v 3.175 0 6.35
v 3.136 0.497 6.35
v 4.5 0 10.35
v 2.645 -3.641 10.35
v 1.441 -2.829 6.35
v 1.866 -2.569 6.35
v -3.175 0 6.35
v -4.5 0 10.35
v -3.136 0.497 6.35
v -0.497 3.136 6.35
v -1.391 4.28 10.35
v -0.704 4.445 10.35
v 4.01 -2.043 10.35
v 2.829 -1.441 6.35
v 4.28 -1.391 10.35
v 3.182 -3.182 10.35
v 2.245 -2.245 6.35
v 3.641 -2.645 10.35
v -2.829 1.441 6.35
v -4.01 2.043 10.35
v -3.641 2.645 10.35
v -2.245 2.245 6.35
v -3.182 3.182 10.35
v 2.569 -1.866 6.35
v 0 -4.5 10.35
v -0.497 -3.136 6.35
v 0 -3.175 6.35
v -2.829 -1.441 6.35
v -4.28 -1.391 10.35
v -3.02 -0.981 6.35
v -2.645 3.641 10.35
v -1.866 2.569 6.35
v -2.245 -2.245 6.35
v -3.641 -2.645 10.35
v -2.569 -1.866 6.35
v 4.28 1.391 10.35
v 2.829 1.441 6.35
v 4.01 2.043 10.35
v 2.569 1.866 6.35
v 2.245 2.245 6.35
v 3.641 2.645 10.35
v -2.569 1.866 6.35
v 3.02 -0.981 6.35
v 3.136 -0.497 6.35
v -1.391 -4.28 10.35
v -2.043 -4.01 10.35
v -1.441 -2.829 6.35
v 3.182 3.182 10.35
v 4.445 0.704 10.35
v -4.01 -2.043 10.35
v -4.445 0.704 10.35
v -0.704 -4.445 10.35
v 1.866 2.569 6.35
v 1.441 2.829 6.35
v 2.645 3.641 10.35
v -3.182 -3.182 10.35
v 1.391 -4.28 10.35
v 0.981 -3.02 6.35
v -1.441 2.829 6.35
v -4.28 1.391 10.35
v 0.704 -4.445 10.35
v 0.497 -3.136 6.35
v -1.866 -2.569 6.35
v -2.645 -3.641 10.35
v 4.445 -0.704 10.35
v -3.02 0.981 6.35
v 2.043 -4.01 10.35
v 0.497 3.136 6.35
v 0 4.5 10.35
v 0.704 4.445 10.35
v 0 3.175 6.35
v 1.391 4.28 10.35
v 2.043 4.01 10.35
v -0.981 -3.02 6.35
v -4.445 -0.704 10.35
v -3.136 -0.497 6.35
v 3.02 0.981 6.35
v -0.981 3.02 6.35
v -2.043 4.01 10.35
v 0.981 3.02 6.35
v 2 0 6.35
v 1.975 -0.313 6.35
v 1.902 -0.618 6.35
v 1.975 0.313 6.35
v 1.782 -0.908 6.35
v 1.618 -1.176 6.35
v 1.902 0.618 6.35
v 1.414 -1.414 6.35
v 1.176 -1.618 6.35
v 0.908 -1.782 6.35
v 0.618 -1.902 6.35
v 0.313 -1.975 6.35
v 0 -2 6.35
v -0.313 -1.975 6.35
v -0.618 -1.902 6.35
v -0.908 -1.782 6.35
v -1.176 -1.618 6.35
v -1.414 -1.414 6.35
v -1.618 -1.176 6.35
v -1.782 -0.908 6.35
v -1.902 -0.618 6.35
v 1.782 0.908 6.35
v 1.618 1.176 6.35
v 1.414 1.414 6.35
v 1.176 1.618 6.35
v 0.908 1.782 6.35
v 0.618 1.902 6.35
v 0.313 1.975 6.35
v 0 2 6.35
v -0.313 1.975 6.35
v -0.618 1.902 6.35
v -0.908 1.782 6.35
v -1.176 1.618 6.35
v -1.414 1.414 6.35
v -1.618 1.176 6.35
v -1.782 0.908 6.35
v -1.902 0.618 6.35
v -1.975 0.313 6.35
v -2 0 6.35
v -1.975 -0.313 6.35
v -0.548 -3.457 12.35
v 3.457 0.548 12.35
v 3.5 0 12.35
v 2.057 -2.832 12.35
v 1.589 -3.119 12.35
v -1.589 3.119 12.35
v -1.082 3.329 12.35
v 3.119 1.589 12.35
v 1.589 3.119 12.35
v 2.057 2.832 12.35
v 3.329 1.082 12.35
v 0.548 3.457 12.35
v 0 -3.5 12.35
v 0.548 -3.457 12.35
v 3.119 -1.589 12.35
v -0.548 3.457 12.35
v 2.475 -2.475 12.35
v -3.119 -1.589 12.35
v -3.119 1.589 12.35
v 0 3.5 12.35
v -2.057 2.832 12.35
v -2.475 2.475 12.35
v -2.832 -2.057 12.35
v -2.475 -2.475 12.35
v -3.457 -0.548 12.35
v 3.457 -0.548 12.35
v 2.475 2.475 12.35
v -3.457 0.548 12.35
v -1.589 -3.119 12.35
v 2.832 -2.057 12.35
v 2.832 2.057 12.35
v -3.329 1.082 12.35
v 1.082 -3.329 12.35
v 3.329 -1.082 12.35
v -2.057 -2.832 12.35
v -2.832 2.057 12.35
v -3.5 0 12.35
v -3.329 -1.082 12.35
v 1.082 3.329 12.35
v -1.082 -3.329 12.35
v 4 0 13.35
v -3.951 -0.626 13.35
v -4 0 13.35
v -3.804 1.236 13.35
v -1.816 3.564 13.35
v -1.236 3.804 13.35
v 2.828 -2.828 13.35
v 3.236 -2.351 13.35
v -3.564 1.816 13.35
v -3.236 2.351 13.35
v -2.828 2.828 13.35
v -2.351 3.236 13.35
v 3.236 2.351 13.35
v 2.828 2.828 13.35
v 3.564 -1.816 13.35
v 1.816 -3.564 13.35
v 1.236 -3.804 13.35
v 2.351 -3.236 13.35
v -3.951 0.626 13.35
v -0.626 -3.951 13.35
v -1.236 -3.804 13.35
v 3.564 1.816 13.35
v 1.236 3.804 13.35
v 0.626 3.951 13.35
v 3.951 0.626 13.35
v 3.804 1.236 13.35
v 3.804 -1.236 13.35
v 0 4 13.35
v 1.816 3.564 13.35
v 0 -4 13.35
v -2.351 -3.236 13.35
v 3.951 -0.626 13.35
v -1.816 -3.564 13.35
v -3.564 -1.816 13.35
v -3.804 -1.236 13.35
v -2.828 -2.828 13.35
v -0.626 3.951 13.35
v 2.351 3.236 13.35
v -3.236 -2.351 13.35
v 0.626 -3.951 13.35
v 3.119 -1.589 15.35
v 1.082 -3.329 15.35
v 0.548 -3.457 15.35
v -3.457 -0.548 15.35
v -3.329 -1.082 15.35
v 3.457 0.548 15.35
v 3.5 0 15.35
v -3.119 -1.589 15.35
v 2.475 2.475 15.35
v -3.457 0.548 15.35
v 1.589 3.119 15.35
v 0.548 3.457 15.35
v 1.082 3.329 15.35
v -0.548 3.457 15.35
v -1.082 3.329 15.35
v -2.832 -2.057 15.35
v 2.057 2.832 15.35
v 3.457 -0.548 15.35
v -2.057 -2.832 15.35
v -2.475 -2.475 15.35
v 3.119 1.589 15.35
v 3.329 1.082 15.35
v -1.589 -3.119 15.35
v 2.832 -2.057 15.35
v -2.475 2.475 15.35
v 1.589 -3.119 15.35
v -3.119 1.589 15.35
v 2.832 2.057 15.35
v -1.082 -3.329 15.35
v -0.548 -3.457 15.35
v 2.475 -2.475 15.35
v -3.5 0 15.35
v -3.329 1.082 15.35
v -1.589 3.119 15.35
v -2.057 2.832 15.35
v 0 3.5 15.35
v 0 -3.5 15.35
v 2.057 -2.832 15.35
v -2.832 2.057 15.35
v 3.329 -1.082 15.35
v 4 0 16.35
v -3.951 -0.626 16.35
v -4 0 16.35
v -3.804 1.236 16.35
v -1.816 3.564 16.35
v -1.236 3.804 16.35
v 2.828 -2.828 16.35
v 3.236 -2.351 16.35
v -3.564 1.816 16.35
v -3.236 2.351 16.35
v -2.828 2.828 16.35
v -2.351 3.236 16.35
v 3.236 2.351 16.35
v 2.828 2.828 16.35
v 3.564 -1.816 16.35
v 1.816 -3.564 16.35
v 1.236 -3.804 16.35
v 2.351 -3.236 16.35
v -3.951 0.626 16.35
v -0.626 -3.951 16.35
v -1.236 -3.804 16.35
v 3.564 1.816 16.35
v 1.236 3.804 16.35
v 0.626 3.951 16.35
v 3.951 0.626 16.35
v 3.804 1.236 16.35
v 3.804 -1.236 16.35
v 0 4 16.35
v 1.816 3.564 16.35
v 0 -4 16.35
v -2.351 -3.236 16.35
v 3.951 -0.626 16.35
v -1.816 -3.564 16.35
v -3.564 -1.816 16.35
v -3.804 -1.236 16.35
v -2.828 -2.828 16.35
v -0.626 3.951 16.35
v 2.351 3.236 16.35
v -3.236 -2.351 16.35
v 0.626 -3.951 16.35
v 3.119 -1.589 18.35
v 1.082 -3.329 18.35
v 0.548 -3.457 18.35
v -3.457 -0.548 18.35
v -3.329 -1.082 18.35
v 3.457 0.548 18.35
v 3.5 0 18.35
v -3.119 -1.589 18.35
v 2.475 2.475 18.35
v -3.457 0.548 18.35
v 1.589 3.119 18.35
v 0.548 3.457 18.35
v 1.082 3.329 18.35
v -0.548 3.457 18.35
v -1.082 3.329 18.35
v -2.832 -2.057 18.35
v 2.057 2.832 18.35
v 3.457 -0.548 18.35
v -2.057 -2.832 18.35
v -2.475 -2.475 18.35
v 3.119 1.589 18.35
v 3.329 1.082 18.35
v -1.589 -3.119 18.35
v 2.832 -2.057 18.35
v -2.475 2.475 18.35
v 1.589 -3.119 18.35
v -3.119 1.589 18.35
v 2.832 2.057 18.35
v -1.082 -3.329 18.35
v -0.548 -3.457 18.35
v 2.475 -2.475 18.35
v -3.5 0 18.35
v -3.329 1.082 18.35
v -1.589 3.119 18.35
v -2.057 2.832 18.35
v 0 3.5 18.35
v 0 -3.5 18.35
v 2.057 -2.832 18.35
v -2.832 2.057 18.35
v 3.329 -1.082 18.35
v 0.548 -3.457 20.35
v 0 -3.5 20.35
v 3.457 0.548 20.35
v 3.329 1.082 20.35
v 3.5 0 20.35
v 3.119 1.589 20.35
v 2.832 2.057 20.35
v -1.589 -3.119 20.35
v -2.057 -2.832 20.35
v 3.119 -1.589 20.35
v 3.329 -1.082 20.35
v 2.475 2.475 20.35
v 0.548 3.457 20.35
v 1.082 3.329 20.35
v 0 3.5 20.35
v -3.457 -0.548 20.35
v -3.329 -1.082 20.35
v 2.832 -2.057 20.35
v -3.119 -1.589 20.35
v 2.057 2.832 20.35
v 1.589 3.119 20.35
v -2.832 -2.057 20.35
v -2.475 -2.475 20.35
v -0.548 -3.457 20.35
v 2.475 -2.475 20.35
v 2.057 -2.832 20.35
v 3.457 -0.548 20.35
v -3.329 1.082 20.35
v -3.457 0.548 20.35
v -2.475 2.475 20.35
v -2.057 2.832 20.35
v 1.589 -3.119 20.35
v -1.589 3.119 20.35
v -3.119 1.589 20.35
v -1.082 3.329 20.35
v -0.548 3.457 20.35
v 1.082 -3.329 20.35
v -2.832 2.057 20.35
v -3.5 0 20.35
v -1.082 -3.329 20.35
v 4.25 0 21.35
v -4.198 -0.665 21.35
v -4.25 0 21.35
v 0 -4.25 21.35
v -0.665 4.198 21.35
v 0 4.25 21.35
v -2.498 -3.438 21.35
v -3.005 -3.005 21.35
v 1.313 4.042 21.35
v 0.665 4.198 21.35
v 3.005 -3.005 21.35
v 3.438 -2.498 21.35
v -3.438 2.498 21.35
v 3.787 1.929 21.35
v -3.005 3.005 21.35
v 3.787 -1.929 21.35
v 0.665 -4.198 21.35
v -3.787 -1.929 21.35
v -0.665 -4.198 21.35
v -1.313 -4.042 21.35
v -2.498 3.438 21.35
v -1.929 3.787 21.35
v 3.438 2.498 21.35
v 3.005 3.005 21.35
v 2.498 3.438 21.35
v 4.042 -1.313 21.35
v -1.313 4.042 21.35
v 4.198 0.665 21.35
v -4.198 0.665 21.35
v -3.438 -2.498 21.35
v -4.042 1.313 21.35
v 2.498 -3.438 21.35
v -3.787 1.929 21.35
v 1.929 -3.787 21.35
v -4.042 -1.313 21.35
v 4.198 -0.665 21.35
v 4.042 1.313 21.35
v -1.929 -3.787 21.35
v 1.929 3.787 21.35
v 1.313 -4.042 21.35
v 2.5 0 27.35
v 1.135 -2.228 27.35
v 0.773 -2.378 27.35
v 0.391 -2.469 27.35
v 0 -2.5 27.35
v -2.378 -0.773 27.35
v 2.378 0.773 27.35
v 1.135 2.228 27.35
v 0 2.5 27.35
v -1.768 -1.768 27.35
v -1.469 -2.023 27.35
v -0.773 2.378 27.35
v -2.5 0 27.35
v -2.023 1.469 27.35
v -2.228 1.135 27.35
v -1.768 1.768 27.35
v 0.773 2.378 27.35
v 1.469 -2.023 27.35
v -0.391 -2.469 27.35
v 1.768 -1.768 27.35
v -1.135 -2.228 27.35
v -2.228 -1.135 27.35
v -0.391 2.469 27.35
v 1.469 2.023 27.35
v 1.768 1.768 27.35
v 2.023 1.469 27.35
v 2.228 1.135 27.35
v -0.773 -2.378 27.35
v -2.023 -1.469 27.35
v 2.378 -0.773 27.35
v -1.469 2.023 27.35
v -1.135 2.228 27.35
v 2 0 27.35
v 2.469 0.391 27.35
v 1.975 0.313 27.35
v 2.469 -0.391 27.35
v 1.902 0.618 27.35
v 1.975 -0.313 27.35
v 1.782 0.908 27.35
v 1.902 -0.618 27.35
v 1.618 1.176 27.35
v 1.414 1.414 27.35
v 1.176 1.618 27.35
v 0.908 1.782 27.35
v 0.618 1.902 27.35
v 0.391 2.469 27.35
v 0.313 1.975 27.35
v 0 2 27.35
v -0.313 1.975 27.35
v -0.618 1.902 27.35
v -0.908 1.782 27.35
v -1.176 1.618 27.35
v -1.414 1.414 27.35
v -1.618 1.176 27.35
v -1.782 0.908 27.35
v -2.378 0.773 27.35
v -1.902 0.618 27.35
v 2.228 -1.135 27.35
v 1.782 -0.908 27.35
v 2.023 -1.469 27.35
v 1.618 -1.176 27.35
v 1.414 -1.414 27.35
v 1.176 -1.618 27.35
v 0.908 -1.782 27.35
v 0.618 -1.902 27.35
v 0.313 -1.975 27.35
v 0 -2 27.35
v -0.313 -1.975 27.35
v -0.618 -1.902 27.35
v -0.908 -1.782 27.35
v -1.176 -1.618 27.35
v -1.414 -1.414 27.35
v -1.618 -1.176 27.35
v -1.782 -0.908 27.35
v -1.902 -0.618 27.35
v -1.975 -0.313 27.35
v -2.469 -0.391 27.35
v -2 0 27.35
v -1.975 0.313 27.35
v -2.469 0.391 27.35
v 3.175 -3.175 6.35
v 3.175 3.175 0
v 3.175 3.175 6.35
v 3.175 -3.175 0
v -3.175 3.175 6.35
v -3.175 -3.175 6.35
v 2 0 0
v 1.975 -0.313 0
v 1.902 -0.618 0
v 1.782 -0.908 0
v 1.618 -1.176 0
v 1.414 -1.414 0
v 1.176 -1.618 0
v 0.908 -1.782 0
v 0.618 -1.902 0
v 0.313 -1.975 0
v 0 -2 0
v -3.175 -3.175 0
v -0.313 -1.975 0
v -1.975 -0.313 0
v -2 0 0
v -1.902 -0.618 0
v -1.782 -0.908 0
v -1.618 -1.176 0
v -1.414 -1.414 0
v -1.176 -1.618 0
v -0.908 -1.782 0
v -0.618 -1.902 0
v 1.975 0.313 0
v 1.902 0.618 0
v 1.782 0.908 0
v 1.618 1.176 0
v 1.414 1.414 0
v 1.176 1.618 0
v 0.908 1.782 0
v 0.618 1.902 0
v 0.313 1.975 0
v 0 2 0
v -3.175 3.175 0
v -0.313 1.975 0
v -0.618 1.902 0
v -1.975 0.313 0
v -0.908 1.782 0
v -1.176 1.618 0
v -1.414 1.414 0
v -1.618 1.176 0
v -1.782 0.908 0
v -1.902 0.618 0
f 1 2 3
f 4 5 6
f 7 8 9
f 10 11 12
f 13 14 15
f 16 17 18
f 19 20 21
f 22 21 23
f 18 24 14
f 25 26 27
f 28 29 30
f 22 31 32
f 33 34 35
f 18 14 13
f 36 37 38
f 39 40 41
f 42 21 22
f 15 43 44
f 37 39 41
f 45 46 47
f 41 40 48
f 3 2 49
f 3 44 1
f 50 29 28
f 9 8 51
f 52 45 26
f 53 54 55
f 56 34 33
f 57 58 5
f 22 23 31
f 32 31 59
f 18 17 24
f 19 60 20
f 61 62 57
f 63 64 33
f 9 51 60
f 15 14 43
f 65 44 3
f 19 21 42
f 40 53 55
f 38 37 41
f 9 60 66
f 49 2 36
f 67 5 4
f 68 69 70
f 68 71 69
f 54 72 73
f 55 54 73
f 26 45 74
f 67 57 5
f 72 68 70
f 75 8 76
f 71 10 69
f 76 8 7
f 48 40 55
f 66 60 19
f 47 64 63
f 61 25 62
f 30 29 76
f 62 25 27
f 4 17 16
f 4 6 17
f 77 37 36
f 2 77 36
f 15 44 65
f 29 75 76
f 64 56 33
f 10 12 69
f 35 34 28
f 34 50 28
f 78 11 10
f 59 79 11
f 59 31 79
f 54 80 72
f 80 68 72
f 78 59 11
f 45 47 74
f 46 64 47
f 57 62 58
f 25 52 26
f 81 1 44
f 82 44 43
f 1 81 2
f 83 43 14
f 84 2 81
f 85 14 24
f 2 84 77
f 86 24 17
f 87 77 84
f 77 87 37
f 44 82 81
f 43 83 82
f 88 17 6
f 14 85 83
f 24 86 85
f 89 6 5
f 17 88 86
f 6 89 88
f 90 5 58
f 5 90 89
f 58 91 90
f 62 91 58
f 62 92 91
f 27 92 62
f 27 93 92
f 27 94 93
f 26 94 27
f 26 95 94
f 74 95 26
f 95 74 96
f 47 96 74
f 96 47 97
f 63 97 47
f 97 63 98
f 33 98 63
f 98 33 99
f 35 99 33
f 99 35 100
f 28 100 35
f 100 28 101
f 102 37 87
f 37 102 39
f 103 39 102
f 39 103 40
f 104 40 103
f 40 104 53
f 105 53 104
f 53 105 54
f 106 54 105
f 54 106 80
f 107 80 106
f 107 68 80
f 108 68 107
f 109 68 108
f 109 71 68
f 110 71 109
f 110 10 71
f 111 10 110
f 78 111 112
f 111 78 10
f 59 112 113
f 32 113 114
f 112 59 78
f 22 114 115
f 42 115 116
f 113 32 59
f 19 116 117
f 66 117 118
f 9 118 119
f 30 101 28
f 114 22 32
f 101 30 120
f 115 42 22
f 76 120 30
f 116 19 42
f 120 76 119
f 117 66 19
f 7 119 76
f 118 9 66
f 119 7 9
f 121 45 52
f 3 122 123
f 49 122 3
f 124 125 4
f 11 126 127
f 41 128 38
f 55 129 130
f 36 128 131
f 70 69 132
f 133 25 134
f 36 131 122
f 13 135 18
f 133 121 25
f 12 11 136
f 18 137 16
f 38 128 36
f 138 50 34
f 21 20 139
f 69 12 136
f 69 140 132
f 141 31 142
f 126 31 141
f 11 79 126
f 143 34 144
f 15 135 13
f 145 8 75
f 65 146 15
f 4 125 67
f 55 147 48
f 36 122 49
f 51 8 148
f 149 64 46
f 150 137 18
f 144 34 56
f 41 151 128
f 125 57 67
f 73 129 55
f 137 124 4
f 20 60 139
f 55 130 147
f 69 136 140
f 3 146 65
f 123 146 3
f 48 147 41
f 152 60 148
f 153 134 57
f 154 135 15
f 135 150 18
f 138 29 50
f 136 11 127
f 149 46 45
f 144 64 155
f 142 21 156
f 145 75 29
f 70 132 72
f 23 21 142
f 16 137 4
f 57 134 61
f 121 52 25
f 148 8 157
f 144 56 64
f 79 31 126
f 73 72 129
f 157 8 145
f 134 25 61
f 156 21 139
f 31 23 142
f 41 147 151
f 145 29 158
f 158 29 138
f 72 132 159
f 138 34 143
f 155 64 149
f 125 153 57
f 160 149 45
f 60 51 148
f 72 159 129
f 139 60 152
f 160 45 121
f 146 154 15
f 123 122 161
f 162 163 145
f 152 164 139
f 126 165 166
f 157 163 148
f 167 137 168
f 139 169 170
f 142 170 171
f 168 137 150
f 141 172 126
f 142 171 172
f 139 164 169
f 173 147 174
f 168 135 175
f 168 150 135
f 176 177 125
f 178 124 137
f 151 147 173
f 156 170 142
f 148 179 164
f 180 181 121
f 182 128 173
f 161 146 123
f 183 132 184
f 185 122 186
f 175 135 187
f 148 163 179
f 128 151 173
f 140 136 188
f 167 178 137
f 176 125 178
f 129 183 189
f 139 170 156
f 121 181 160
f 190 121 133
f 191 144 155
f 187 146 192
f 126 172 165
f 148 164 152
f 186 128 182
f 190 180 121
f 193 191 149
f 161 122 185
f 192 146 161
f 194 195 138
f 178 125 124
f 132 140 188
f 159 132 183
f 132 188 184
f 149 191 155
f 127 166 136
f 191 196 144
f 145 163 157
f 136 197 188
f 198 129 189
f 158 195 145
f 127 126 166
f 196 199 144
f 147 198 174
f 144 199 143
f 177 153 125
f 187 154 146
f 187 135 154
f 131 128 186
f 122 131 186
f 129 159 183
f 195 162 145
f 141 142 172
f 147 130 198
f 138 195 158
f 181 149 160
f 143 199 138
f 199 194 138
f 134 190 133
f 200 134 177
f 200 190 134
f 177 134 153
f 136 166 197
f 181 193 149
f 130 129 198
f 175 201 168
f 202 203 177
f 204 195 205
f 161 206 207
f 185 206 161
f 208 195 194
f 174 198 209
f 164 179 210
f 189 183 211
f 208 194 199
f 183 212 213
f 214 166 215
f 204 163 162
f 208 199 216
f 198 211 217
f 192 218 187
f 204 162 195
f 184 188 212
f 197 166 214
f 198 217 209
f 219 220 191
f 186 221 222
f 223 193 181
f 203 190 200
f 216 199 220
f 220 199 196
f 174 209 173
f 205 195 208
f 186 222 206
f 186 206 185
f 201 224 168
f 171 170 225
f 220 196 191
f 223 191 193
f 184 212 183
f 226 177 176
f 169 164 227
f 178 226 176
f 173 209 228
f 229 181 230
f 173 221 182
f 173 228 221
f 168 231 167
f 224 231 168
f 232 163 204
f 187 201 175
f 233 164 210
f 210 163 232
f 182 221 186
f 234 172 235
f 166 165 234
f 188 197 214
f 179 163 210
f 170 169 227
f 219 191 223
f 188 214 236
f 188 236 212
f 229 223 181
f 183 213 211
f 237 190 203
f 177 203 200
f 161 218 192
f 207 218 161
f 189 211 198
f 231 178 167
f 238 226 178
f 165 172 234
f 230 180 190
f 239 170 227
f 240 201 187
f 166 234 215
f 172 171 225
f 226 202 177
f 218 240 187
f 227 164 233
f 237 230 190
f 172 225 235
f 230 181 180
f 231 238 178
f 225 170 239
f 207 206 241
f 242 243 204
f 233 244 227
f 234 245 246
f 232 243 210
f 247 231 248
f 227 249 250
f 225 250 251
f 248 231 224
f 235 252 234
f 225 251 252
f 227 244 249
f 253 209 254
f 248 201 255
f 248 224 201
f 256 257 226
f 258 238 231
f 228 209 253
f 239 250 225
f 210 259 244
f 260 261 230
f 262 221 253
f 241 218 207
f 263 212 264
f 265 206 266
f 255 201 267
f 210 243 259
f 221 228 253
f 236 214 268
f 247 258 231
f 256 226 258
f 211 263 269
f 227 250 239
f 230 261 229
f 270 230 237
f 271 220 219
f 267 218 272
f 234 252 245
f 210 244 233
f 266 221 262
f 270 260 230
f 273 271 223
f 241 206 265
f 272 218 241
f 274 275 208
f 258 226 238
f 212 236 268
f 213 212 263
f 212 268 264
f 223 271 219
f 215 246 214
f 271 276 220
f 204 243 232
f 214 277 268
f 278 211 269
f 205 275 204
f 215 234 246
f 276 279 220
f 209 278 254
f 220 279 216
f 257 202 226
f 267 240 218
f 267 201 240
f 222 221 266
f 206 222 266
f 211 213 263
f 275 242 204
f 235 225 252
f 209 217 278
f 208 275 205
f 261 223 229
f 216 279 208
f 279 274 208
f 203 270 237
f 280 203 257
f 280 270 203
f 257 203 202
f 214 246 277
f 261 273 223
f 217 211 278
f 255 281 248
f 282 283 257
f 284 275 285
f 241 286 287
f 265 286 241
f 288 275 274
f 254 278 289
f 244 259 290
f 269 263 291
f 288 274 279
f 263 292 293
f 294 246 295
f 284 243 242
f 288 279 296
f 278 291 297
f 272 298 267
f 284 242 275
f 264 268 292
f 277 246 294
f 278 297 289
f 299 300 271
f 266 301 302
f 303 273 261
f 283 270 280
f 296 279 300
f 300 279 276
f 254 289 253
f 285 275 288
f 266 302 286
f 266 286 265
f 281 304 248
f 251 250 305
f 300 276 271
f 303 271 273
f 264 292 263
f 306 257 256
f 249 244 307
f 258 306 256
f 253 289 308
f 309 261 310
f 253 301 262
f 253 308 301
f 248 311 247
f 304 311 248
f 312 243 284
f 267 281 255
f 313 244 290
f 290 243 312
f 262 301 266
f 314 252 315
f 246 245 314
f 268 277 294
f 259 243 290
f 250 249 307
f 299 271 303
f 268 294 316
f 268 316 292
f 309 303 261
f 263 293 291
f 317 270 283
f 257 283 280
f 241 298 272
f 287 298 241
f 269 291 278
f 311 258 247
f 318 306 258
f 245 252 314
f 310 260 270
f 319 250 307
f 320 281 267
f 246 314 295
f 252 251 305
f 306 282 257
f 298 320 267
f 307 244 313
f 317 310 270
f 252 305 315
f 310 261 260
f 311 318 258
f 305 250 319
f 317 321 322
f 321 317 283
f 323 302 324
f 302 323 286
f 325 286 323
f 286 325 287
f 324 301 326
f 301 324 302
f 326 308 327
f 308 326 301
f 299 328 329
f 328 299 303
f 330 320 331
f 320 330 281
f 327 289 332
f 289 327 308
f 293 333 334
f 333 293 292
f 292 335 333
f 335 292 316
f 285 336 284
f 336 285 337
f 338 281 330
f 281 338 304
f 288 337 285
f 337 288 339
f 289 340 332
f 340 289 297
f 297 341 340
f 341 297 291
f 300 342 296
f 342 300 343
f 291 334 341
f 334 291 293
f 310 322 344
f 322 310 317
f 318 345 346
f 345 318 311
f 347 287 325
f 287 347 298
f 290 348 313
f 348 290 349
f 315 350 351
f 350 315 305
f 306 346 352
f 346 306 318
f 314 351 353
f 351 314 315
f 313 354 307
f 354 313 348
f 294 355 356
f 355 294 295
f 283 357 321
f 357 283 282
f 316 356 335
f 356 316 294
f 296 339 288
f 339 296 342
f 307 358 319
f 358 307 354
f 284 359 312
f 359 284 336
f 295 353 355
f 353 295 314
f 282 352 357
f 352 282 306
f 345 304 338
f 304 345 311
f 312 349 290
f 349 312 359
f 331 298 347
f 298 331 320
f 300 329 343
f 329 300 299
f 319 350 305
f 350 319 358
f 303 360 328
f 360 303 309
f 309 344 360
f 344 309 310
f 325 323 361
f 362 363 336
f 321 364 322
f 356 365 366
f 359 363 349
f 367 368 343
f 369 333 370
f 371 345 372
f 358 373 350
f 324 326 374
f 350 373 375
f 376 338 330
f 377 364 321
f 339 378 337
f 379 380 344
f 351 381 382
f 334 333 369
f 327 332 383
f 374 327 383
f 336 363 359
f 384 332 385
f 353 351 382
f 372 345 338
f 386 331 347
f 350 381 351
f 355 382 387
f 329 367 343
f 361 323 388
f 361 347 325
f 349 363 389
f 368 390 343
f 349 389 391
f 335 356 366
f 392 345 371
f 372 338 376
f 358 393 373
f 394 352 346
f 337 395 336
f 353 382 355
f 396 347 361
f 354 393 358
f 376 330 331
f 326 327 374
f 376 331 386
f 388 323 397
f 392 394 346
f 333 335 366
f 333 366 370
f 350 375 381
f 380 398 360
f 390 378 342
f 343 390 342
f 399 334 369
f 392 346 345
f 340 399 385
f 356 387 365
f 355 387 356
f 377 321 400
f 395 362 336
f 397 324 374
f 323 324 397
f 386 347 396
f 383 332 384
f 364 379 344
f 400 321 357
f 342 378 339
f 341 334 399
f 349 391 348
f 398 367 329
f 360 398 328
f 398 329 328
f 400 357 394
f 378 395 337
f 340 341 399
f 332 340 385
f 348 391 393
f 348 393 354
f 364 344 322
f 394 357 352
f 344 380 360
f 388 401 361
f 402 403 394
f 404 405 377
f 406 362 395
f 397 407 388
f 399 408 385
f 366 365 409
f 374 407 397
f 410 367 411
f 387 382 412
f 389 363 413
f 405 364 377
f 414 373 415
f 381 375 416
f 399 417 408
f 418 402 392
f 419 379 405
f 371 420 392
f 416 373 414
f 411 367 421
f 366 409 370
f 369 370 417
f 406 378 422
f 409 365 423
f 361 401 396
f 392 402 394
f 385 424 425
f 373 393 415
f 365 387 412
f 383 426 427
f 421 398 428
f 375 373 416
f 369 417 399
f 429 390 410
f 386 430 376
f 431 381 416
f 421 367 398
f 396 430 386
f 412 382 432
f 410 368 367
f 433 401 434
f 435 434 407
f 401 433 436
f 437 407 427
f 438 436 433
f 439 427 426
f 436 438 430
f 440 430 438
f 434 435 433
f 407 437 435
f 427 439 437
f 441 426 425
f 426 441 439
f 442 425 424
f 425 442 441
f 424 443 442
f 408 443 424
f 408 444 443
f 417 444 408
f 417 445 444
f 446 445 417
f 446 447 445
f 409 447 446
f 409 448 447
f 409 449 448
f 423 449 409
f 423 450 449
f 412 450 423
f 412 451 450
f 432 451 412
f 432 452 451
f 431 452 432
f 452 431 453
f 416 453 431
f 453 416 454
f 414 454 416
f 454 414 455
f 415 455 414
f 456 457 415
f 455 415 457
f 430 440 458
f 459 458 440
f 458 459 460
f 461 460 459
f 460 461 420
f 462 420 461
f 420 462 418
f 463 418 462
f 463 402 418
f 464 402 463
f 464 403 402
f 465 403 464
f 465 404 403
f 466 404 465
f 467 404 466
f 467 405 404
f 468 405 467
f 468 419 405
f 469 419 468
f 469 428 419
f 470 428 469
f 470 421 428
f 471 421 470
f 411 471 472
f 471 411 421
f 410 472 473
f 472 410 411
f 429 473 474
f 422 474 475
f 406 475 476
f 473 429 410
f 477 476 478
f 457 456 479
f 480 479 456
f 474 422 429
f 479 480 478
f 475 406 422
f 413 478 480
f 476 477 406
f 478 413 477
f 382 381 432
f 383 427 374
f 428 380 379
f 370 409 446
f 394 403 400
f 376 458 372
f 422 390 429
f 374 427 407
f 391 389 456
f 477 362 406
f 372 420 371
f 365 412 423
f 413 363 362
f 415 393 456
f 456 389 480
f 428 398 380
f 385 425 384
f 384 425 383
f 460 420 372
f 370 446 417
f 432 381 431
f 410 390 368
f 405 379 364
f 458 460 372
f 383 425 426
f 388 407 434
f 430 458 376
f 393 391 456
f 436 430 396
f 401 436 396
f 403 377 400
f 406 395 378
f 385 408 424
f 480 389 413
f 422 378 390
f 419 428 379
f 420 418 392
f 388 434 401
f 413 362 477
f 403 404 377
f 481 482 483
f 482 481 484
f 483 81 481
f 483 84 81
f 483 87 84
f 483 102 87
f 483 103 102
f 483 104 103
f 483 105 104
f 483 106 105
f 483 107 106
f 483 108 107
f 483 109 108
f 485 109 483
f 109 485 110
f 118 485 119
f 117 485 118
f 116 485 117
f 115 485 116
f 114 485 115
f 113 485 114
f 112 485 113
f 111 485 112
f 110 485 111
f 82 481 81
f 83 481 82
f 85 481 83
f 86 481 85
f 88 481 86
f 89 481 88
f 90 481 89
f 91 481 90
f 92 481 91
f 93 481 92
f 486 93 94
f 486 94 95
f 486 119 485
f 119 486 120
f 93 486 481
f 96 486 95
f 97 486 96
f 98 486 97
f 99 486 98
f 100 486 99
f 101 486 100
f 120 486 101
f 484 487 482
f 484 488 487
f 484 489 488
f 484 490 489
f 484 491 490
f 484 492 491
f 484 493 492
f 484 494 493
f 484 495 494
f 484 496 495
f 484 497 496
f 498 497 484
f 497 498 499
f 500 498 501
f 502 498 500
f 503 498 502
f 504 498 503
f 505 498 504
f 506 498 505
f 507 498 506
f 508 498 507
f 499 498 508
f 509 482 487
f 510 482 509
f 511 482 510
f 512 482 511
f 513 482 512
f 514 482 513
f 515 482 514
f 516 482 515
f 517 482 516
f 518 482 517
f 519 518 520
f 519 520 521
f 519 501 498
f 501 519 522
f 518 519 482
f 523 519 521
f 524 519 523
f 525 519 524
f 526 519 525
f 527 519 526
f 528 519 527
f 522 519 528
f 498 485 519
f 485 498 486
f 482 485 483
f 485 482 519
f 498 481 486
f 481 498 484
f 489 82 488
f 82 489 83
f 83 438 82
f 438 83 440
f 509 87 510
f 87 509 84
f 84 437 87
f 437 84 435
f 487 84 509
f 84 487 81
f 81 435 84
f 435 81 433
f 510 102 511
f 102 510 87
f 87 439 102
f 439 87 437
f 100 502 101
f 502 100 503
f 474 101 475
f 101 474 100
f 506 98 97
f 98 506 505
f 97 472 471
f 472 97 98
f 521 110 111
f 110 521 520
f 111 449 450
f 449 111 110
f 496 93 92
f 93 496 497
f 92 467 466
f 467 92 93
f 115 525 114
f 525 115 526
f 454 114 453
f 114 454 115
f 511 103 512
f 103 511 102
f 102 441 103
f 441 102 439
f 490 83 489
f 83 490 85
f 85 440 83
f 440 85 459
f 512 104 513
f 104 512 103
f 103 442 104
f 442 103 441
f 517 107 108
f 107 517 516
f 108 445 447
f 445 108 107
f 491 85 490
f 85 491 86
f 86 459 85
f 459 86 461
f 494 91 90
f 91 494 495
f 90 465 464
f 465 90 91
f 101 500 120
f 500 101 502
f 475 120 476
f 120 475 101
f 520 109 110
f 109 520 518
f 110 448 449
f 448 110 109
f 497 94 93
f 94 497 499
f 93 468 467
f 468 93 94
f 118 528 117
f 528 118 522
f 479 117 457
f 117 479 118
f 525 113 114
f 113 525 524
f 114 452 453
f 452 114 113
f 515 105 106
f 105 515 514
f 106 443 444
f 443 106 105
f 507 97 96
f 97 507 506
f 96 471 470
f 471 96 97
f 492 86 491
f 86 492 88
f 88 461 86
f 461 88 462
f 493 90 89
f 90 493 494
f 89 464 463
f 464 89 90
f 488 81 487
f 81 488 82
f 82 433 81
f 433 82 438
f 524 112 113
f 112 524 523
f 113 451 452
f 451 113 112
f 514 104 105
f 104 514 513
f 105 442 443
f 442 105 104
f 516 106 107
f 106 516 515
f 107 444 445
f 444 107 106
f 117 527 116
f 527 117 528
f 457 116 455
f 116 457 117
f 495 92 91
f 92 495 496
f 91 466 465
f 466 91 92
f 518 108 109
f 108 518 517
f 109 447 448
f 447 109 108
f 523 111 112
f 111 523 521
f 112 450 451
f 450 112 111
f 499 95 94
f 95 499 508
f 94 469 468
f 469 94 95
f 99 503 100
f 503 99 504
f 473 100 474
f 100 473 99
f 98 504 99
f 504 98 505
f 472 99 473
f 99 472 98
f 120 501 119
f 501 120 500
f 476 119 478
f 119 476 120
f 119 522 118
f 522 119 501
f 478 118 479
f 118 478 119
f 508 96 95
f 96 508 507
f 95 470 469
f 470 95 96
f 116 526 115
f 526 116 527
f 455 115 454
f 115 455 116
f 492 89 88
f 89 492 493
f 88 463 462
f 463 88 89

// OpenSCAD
$fn=40;
difference() {
  union() {
    translate([inches(-1/8),inches(-1/8)]) cube(inches(1/4));
    translate([0,0,inches(1/4)]) {
      cylinder(d1=inches(1/4),d2=9,h=4);
      translate([0,0,4])
        cylinder(d1=9,d2=7,h=2);
      translate([0,0,6])
        cylinder(d1=7,d2=8,h=1);
      translate([0,0,7])
        cylinder(d1=8,d2=7,h=2);
      translate([0,0,9])
        cylinder(d1=7,d2=8,h=1);
      translate([0,0,10])
        cylinder(d1=8,d2=7,h=2);
      translate([0,0,12])
        cylinder(d=7,h=2);
      translate([0,0,14])
        cylinder(d1=7,d2=8.5,h=1);
      translate([0,0,15])
        cylinder(d1=8.5,d2=5,h=6);
    }
  }
translate([0,0,-.01]) cylinder(d=4,h=inches(2),$fn=40);
}
function inches(in) = 25.4*in;
